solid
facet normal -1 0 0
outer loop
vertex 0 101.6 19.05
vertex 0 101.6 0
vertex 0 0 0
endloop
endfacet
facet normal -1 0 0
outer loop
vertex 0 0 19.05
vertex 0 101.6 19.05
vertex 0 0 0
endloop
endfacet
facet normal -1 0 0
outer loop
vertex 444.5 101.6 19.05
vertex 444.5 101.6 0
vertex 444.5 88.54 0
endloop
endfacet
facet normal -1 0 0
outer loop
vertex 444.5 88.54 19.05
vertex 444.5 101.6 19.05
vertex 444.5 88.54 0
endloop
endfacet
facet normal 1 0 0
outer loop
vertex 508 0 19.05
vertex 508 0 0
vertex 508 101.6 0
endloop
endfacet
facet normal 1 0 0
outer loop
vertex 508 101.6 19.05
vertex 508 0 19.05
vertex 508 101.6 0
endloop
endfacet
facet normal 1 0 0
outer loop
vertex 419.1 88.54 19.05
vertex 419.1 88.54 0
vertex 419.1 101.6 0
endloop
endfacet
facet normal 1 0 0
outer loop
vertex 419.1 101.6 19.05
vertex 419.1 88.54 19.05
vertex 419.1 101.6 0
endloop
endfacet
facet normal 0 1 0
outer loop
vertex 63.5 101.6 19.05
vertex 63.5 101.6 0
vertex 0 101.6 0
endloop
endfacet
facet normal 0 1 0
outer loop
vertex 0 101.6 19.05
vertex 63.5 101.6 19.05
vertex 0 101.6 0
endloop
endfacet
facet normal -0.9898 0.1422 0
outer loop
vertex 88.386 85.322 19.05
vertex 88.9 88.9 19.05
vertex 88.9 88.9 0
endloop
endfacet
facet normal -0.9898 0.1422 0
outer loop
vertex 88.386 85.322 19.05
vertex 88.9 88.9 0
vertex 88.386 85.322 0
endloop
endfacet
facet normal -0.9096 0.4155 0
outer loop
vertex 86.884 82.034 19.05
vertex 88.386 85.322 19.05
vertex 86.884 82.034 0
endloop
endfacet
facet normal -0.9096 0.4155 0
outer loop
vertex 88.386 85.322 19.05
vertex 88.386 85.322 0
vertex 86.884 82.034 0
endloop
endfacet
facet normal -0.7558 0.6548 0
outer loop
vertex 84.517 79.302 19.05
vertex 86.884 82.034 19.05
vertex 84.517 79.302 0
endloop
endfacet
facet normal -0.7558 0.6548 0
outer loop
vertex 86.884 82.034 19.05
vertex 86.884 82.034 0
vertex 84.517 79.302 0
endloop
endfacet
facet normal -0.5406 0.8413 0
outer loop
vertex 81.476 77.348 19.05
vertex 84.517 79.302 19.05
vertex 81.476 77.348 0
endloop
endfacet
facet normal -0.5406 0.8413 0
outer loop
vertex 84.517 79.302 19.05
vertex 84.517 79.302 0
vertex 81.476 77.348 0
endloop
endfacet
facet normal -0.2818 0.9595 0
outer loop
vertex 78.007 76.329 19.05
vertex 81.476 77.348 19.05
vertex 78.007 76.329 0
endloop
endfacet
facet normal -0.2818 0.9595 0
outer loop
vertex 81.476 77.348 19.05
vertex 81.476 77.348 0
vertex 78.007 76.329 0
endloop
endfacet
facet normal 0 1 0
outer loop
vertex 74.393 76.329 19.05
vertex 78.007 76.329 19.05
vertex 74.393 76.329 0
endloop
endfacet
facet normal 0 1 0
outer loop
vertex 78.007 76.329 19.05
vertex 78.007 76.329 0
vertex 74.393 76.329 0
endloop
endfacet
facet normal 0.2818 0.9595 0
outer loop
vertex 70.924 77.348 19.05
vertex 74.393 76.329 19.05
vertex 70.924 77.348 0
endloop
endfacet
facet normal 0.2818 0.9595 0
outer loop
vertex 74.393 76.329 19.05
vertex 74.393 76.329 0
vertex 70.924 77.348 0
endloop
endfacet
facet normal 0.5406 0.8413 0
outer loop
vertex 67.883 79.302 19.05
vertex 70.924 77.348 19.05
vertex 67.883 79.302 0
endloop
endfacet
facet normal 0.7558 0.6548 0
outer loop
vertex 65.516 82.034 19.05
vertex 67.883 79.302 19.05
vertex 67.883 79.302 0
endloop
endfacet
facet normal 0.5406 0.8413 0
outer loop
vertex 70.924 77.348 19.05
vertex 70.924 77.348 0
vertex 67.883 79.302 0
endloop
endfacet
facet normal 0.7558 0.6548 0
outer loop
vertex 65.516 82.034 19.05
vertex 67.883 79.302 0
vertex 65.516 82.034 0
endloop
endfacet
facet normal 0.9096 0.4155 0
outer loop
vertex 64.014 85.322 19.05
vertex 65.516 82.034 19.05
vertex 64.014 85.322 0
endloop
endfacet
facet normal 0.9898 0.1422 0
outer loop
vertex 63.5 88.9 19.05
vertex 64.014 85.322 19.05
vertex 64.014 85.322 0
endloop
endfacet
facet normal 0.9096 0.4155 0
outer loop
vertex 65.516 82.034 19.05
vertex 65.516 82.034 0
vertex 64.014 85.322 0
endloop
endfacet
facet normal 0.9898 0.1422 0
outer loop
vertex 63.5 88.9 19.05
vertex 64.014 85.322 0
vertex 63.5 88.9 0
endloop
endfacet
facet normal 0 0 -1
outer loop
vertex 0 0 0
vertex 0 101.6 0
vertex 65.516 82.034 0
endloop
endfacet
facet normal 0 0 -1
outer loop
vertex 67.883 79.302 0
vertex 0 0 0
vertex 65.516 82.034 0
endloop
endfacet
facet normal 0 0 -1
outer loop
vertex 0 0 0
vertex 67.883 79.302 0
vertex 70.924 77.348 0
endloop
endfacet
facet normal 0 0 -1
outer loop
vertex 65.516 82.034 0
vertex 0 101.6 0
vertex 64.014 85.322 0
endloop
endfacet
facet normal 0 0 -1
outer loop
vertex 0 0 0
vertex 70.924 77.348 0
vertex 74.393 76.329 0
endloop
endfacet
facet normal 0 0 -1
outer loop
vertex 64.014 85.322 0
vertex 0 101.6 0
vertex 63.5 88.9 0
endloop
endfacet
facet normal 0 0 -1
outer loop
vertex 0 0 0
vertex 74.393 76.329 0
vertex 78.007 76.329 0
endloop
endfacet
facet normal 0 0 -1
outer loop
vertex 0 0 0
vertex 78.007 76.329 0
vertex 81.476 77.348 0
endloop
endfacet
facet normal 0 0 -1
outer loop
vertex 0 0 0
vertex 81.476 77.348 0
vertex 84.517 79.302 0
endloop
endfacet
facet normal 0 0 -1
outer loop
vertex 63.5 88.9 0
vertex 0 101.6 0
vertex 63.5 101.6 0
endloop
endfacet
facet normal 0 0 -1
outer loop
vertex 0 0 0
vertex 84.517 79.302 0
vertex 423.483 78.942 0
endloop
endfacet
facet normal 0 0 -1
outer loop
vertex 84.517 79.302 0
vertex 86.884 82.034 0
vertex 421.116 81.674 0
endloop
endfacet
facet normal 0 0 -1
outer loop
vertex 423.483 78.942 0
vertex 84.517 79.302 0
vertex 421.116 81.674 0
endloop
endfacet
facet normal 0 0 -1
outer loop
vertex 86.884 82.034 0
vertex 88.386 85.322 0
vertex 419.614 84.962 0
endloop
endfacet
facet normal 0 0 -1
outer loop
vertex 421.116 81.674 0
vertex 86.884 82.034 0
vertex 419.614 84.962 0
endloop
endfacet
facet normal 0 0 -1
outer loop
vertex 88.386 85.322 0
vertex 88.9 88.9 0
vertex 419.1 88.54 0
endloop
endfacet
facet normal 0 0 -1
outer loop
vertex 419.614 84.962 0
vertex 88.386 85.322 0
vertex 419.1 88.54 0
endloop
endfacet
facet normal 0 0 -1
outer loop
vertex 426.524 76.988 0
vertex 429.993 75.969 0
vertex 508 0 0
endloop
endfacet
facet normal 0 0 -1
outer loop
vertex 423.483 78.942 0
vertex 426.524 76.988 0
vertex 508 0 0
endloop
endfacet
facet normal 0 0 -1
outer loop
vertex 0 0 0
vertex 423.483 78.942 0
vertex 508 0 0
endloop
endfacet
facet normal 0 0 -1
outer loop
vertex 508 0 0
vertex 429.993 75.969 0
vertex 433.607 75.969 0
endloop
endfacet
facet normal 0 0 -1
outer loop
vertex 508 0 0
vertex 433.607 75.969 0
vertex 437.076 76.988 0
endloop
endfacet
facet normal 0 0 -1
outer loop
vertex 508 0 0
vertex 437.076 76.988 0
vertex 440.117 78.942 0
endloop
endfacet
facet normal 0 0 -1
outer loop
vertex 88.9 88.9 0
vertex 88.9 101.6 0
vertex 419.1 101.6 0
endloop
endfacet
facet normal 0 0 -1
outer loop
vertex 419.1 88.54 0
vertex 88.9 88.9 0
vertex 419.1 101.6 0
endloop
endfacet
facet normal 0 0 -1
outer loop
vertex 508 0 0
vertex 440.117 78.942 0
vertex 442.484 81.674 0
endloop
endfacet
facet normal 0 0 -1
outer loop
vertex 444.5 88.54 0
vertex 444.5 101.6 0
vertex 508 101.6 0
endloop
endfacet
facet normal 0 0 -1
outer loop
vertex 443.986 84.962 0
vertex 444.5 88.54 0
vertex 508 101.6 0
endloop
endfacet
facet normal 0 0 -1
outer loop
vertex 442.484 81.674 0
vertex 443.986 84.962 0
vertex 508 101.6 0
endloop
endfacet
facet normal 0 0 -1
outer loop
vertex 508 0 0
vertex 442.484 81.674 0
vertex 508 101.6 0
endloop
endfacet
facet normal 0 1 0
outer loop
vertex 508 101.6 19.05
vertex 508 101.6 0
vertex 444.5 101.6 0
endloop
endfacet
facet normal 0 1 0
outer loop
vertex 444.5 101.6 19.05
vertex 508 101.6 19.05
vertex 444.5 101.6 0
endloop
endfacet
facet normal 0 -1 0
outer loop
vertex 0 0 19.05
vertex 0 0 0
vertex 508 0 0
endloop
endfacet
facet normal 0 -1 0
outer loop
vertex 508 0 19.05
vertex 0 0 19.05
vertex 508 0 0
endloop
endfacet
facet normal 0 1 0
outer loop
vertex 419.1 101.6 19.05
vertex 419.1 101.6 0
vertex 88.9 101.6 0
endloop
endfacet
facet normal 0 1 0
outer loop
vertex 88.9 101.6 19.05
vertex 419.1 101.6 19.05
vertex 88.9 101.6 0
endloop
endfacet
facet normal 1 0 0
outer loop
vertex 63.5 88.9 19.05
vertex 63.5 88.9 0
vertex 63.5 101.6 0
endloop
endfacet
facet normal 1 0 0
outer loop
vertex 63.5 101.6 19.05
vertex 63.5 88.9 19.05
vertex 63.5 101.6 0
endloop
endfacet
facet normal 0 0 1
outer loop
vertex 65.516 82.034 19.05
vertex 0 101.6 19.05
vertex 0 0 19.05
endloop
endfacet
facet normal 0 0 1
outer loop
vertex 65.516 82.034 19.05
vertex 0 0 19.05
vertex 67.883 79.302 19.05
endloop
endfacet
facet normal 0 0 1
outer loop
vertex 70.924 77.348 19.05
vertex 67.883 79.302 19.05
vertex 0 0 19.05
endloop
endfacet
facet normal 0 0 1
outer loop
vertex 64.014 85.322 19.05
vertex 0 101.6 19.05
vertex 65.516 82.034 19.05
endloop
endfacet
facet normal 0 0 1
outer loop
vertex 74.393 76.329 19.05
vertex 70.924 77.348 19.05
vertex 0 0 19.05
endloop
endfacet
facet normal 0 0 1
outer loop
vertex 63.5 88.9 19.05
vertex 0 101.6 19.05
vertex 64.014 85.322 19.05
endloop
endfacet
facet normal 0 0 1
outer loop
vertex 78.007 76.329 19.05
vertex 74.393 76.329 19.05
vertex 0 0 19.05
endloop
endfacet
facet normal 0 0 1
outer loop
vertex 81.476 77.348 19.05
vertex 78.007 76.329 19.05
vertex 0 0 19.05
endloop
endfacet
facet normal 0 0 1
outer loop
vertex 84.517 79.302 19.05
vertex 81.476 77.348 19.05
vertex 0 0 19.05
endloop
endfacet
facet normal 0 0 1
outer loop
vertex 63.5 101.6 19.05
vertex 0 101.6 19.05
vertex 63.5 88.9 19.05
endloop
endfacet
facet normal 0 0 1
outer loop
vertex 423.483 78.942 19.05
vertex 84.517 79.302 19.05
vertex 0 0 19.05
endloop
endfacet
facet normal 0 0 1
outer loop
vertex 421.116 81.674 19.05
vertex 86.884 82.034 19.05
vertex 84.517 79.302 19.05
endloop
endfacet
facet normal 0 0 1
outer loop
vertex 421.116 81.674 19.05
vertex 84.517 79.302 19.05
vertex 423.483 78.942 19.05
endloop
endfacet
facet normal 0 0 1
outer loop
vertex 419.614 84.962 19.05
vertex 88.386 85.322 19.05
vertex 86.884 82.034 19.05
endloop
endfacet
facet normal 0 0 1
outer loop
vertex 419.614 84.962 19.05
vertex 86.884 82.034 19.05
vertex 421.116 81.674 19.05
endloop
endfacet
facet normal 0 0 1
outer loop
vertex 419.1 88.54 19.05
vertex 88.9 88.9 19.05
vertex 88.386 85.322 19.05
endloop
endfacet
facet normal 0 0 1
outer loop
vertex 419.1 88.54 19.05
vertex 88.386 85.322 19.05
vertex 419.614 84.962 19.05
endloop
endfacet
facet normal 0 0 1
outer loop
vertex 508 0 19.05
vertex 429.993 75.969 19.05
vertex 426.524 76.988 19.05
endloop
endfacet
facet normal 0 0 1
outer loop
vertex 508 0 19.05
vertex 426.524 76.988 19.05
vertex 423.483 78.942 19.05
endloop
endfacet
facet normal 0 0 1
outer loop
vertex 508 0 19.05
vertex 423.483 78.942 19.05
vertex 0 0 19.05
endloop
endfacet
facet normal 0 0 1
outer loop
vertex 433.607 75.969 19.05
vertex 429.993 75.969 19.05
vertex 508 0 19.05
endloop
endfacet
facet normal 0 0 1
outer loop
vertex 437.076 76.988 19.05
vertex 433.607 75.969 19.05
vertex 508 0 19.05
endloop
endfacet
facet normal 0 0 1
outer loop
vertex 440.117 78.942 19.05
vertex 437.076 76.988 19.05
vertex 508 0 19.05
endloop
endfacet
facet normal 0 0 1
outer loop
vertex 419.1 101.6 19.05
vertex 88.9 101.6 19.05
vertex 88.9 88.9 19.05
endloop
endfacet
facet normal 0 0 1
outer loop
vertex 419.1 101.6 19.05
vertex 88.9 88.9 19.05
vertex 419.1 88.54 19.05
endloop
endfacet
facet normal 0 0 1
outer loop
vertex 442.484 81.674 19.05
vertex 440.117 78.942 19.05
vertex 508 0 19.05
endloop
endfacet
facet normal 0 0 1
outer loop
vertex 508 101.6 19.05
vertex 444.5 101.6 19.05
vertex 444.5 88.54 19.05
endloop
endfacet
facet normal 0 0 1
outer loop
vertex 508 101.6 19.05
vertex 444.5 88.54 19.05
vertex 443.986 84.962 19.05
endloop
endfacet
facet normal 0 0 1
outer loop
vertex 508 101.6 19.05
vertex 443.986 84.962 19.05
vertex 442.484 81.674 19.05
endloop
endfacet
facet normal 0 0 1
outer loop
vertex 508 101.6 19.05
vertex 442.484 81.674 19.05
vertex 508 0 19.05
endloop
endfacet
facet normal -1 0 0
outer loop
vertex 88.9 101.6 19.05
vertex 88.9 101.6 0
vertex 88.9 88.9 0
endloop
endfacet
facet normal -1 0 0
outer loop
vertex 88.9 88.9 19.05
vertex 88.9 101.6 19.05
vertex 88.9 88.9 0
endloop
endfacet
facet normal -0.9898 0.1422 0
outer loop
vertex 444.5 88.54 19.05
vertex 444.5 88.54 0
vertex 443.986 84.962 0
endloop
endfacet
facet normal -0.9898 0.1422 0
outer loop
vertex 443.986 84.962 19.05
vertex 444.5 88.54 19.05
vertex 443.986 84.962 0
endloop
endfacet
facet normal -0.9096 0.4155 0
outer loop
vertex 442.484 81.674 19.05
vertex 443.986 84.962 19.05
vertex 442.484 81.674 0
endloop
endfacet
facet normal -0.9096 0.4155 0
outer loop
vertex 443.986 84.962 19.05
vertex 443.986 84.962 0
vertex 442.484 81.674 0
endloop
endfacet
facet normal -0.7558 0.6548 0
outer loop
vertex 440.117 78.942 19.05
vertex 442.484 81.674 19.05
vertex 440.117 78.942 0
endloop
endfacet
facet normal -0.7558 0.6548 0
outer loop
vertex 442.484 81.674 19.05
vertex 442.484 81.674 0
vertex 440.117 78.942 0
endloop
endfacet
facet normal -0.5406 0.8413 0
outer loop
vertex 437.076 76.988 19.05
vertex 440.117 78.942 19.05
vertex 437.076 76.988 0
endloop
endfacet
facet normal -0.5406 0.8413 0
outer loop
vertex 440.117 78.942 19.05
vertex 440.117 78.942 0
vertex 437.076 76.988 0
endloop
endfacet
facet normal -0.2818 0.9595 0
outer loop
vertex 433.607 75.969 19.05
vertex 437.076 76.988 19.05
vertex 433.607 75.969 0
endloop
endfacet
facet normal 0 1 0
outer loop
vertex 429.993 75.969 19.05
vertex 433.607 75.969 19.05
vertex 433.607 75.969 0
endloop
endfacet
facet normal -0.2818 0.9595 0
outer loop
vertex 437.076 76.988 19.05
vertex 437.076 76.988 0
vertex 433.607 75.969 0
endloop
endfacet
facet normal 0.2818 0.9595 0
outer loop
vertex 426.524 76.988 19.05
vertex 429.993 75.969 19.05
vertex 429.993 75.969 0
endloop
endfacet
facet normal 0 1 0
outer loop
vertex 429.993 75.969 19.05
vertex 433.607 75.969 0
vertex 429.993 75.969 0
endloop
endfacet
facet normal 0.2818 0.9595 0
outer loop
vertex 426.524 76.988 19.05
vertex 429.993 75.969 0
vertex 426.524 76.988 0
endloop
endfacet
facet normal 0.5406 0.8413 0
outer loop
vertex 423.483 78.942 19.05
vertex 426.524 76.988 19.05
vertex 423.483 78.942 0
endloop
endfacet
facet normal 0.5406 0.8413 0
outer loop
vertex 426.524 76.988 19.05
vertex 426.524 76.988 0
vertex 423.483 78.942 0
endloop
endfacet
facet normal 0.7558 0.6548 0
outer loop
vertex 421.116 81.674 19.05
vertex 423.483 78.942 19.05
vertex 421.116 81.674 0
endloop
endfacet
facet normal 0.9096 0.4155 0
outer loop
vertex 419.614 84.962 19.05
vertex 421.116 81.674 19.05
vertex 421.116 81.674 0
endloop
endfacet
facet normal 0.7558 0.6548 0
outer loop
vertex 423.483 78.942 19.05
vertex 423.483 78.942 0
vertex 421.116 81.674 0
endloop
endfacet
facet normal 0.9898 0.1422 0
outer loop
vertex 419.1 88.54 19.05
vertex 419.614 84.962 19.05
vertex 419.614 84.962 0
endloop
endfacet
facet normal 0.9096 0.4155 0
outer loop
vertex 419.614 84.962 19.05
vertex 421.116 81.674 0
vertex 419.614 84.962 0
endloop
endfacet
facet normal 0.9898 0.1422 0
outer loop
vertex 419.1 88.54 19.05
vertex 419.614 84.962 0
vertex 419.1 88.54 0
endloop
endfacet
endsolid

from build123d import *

# Parameters (mm, degrees)
BOSS_EXTRUDE1_DEPTH = 19.05


with BuildPart() as part:
    # Sketch1 → Boss-Extrude1 (new body)
    with BuildSketch(Plane.XY):
        with BuildLine():
            Line((0, 101.6), (0, 0))
            Line((0, 0), (508, 0))
            Line((508, 0), (508, 101.6))
            Line((508, 101.6), (444.5, 101.6))
            Line((444.5, 101.6), (444.5, 88.540005908))
            ThreePointArc((444.5, 88.540005908), (431.8, 75.840005908), (419.1, 88.540005908))
            Line((419.1, 88.540005908), (419.1, 101.6))
            Line((419.1, 101.6), (88.9, 101.6))
            Line((88.9, 101.6), (88.9, 88.9))
            ThreePointArc((88.9, 88.9), (76.2, 76.2), (63.5, 88.9))
            Line((63.5, 88.9), (63.5, 101.6))
            Line((63.5, 101.6), (0, 101.6))
        make_face()
    extrude(amount=BOSS_EXTRUDE1_DEPTH)


solid = part.part
